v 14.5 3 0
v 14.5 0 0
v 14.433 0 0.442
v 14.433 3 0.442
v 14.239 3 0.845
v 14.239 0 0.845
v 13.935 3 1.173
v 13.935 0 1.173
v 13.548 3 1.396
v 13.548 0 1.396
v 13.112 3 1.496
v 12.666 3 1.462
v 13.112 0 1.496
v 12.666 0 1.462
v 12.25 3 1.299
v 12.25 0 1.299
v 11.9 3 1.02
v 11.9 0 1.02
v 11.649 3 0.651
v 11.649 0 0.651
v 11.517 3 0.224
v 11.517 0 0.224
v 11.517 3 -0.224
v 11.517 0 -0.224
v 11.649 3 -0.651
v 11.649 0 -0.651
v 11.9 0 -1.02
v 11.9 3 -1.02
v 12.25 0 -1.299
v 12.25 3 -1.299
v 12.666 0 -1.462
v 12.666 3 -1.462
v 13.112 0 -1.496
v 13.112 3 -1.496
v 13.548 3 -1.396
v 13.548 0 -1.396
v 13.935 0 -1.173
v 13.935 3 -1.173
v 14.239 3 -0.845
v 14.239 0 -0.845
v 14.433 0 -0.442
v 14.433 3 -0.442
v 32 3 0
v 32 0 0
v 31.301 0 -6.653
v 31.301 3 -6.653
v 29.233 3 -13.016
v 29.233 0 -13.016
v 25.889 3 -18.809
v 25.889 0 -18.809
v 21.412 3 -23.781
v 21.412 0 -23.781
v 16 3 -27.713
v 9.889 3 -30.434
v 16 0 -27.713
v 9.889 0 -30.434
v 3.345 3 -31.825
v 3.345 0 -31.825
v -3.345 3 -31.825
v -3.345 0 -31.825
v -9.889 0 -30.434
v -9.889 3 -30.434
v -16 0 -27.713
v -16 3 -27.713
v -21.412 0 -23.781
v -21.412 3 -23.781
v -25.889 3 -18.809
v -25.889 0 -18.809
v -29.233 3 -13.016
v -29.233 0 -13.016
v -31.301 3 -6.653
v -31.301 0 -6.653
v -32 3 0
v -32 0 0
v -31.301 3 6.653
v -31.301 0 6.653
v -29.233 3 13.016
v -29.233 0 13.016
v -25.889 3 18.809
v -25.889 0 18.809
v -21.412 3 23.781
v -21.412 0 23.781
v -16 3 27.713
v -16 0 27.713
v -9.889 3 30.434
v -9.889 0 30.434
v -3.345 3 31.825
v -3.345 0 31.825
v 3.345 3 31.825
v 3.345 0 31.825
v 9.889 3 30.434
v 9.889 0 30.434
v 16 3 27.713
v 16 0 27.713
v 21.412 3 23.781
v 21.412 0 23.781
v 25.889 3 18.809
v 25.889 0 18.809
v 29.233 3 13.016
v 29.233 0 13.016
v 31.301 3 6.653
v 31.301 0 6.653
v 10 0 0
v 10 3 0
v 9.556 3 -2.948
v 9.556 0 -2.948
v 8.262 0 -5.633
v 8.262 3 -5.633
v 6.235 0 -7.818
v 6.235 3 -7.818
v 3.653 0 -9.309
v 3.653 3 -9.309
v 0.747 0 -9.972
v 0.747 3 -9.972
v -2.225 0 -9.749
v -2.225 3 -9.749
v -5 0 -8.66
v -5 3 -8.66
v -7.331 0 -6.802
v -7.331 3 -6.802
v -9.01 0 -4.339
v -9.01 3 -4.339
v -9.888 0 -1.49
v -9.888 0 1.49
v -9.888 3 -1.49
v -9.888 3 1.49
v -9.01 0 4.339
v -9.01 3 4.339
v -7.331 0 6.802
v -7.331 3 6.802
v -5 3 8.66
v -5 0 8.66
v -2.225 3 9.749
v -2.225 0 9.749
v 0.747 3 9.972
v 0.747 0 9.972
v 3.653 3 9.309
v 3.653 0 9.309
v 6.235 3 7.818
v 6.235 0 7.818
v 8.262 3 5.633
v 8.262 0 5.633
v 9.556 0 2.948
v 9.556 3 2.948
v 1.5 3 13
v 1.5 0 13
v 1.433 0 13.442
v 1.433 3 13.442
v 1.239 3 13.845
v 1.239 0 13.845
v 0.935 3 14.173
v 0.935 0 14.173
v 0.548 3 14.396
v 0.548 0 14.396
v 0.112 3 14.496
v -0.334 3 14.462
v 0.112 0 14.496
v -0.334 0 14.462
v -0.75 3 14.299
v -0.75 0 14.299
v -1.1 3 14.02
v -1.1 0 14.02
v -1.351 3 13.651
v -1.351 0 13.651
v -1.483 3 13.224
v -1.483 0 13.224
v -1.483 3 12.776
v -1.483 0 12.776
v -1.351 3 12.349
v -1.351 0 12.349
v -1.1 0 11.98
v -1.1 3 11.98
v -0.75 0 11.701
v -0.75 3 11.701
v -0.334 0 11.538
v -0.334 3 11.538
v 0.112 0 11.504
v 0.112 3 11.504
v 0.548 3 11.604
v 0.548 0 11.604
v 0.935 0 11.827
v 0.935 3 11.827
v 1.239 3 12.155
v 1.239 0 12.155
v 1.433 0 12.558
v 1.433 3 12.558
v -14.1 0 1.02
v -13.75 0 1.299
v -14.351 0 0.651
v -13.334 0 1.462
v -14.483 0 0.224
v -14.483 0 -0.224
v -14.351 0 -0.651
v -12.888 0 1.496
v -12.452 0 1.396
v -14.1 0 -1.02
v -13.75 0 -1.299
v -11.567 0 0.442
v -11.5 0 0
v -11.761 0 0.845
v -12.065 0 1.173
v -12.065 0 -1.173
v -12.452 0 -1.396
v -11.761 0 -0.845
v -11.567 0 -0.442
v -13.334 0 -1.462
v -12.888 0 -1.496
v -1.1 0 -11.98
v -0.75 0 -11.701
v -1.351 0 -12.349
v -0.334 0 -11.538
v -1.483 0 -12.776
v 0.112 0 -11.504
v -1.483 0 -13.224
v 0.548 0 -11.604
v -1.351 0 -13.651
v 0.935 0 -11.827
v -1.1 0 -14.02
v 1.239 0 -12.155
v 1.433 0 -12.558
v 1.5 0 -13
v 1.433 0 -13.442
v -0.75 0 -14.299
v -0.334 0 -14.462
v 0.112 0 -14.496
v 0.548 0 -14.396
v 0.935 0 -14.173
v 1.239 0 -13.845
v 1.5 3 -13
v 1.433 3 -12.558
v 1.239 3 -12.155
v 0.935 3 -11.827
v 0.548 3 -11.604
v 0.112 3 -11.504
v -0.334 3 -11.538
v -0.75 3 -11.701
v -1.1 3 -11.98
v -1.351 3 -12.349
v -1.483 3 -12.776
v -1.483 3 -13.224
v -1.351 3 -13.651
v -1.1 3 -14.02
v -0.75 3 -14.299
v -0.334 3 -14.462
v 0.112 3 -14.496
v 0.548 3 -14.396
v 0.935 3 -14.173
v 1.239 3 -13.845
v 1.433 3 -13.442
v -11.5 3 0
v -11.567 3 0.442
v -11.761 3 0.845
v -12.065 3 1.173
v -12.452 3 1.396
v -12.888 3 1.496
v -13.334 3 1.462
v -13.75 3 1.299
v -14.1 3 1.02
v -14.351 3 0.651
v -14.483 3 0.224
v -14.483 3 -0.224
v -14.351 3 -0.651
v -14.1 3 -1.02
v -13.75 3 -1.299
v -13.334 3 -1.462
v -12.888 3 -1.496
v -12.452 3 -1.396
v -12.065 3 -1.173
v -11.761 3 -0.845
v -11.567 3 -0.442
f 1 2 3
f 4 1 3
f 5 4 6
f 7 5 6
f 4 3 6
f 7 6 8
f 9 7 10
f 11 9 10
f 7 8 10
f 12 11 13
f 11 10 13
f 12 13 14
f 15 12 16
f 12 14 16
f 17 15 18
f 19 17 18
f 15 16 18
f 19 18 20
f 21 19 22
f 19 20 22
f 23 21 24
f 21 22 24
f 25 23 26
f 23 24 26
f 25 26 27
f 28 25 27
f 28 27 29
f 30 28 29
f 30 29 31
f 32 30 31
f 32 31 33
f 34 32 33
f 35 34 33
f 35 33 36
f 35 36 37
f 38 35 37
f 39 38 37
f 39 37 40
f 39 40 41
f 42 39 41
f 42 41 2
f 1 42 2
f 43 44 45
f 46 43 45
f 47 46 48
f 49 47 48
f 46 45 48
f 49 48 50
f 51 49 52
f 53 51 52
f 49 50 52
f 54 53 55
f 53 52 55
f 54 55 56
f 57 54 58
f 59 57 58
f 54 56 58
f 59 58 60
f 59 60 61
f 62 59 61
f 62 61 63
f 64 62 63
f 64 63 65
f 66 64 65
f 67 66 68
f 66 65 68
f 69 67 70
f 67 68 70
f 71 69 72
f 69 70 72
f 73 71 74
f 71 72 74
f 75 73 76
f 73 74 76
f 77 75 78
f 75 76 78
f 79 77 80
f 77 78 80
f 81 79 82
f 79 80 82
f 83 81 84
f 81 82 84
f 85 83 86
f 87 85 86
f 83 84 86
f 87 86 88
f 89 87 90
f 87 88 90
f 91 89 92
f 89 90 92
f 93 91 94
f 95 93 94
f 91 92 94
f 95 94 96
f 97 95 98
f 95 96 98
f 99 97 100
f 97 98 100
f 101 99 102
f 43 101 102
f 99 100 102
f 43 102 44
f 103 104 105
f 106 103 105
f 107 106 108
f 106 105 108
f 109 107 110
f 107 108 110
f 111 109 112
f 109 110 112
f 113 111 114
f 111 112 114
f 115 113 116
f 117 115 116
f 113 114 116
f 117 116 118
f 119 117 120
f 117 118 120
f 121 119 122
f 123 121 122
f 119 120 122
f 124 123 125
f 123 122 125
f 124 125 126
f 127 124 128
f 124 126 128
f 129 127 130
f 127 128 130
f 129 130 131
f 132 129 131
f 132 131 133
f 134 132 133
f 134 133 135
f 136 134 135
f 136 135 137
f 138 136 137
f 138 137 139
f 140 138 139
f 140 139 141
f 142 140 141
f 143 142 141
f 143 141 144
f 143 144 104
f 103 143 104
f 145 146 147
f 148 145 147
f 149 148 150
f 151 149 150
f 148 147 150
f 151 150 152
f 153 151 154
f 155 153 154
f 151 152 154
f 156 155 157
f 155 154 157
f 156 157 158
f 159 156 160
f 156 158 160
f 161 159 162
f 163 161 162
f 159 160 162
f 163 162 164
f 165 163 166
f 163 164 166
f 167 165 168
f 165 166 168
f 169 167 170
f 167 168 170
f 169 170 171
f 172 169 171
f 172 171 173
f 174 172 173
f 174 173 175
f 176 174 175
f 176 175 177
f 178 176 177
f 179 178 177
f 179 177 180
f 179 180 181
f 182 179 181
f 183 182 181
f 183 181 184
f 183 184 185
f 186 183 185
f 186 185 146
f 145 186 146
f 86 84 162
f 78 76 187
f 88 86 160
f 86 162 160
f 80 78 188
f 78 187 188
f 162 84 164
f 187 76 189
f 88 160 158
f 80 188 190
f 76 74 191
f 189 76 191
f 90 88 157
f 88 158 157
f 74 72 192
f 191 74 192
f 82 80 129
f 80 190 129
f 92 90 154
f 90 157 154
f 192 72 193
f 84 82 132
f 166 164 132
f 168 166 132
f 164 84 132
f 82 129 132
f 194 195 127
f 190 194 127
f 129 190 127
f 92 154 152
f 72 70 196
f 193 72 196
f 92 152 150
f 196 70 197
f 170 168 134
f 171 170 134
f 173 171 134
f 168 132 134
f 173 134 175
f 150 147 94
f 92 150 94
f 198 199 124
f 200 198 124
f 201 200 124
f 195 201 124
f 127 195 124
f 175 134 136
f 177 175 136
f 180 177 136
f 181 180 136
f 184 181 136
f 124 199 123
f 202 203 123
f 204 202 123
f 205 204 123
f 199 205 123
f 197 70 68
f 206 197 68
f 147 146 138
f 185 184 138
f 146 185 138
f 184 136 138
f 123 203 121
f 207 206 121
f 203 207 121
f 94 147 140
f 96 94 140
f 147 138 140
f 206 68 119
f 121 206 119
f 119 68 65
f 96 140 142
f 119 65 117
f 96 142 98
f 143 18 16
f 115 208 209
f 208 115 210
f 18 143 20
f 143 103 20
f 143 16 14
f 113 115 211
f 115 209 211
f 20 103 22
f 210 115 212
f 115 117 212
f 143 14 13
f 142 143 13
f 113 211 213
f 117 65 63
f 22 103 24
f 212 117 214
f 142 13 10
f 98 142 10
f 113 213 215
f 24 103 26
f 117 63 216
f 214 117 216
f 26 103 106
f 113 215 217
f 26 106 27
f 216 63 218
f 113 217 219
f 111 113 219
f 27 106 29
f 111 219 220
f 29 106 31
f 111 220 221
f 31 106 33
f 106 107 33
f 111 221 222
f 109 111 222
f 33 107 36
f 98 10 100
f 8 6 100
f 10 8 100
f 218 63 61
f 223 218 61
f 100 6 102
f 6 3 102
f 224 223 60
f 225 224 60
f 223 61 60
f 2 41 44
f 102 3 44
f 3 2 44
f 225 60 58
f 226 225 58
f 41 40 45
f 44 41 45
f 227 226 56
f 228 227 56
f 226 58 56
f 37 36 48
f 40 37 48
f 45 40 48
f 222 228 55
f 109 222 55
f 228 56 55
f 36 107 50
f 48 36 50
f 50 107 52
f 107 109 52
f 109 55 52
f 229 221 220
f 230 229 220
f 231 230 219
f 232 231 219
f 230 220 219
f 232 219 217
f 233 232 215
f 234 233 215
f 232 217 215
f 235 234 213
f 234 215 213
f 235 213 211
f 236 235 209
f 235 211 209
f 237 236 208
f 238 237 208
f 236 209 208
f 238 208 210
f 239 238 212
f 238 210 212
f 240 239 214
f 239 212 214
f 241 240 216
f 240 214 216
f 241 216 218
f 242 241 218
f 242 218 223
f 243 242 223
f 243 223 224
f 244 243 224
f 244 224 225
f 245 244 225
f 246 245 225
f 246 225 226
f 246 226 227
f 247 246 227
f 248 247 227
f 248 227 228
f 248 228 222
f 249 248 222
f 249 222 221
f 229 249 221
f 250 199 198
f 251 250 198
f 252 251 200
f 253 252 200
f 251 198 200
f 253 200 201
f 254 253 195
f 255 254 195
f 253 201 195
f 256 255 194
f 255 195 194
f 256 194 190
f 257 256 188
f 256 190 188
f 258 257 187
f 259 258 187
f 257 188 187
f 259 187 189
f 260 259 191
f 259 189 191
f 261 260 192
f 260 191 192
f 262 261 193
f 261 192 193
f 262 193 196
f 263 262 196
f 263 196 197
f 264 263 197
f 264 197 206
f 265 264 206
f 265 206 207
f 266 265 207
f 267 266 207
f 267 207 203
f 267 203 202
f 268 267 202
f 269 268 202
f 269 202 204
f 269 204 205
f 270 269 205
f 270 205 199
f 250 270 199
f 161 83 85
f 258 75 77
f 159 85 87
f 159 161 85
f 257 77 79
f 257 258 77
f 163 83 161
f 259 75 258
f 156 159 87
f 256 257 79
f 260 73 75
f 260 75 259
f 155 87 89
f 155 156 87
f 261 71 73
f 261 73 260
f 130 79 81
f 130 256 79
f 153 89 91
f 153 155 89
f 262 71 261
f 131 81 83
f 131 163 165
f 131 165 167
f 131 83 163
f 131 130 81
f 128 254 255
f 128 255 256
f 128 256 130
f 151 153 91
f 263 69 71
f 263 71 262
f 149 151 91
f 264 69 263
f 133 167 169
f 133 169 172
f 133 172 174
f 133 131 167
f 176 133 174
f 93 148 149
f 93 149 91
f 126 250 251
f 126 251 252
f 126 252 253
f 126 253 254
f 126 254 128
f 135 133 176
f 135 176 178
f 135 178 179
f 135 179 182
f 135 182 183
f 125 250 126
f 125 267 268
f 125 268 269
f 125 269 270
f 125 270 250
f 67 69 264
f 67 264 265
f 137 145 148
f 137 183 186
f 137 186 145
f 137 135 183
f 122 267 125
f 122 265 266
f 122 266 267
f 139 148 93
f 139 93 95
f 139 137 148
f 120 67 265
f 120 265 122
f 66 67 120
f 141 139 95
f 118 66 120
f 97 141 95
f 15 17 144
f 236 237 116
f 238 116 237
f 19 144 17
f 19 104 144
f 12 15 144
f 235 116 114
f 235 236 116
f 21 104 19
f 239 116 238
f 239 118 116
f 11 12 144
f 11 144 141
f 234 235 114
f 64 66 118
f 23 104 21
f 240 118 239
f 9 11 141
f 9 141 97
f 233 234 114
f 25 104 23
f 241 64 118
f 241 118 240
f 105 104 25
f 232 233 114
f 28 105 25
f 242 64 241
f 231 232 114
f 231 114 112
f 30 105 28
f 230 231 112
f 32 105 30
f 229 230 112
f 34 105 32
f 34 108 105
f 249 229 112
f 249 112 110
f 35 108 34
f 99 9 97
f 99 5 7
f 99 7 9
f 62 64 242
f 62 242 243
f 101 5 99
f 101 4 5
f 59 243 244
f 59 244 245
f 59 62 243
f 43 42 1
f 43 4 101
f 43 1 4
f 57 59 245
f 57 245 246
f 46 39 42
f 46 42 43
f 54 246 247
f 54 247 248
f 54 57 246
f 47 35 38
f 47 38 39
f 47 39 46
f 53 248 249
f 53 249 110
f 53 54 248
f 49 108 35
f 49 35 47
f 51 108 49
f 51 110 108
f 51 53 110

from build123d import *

# Parameters (mm, degrees)
SKETCH1_R           = 32
BOSS_EXTRUDE1_DEPTH = 3
SKETCH2_R           = 10
CUT_EXTRUDE1_DEPTH  = 10
SKETCH3_R           = 1.5
CUT_EXTRUDE2_DEPTH  = 4


with BuildPart() as part:
    # Sketch1 → Boss-Extrude1 (new body)
    with BuildSketch(Plane(origin=(0, 0, 0), x_dir=(1, 0, 0), z_dir=(0, 1, 0))):
        Circle(SKETCH1_R)
    extrude(amount=BOSS_EXTRUDE1_DEPTH)

    # Sketch2 → Cut-Extrude1 (cut)
    with BuildSketch(Plane(origin=(0, 3, 0), x_dir=(1, 0, 0), z_dir=(0, 1, 0))):
        Circle(SKETCH2_R)
    extrude(amount=-CUT_EXTRUDE1_DEPTH, mode=Mode.SUBTRACT)

    # Sketch3 → Cut-Extrude2 (cut, through all)
    with BuildSketch(Plane.XZ):
        with Locations((13, 0)):
            Circle(SKETCH3_R)
        with Locations((0, -13)):
            Circle(SKETCH3_R)
        with Locations((-13, 0)):
            Circle(SKETCH3_R)
        with Locations((0, 13)):
            Circle(SKETCH3_R)
    extrude(amount=-CUT_EXTRUDE2_DEPTH, mode=Mode.SUBTRACT)


solid = part.part
